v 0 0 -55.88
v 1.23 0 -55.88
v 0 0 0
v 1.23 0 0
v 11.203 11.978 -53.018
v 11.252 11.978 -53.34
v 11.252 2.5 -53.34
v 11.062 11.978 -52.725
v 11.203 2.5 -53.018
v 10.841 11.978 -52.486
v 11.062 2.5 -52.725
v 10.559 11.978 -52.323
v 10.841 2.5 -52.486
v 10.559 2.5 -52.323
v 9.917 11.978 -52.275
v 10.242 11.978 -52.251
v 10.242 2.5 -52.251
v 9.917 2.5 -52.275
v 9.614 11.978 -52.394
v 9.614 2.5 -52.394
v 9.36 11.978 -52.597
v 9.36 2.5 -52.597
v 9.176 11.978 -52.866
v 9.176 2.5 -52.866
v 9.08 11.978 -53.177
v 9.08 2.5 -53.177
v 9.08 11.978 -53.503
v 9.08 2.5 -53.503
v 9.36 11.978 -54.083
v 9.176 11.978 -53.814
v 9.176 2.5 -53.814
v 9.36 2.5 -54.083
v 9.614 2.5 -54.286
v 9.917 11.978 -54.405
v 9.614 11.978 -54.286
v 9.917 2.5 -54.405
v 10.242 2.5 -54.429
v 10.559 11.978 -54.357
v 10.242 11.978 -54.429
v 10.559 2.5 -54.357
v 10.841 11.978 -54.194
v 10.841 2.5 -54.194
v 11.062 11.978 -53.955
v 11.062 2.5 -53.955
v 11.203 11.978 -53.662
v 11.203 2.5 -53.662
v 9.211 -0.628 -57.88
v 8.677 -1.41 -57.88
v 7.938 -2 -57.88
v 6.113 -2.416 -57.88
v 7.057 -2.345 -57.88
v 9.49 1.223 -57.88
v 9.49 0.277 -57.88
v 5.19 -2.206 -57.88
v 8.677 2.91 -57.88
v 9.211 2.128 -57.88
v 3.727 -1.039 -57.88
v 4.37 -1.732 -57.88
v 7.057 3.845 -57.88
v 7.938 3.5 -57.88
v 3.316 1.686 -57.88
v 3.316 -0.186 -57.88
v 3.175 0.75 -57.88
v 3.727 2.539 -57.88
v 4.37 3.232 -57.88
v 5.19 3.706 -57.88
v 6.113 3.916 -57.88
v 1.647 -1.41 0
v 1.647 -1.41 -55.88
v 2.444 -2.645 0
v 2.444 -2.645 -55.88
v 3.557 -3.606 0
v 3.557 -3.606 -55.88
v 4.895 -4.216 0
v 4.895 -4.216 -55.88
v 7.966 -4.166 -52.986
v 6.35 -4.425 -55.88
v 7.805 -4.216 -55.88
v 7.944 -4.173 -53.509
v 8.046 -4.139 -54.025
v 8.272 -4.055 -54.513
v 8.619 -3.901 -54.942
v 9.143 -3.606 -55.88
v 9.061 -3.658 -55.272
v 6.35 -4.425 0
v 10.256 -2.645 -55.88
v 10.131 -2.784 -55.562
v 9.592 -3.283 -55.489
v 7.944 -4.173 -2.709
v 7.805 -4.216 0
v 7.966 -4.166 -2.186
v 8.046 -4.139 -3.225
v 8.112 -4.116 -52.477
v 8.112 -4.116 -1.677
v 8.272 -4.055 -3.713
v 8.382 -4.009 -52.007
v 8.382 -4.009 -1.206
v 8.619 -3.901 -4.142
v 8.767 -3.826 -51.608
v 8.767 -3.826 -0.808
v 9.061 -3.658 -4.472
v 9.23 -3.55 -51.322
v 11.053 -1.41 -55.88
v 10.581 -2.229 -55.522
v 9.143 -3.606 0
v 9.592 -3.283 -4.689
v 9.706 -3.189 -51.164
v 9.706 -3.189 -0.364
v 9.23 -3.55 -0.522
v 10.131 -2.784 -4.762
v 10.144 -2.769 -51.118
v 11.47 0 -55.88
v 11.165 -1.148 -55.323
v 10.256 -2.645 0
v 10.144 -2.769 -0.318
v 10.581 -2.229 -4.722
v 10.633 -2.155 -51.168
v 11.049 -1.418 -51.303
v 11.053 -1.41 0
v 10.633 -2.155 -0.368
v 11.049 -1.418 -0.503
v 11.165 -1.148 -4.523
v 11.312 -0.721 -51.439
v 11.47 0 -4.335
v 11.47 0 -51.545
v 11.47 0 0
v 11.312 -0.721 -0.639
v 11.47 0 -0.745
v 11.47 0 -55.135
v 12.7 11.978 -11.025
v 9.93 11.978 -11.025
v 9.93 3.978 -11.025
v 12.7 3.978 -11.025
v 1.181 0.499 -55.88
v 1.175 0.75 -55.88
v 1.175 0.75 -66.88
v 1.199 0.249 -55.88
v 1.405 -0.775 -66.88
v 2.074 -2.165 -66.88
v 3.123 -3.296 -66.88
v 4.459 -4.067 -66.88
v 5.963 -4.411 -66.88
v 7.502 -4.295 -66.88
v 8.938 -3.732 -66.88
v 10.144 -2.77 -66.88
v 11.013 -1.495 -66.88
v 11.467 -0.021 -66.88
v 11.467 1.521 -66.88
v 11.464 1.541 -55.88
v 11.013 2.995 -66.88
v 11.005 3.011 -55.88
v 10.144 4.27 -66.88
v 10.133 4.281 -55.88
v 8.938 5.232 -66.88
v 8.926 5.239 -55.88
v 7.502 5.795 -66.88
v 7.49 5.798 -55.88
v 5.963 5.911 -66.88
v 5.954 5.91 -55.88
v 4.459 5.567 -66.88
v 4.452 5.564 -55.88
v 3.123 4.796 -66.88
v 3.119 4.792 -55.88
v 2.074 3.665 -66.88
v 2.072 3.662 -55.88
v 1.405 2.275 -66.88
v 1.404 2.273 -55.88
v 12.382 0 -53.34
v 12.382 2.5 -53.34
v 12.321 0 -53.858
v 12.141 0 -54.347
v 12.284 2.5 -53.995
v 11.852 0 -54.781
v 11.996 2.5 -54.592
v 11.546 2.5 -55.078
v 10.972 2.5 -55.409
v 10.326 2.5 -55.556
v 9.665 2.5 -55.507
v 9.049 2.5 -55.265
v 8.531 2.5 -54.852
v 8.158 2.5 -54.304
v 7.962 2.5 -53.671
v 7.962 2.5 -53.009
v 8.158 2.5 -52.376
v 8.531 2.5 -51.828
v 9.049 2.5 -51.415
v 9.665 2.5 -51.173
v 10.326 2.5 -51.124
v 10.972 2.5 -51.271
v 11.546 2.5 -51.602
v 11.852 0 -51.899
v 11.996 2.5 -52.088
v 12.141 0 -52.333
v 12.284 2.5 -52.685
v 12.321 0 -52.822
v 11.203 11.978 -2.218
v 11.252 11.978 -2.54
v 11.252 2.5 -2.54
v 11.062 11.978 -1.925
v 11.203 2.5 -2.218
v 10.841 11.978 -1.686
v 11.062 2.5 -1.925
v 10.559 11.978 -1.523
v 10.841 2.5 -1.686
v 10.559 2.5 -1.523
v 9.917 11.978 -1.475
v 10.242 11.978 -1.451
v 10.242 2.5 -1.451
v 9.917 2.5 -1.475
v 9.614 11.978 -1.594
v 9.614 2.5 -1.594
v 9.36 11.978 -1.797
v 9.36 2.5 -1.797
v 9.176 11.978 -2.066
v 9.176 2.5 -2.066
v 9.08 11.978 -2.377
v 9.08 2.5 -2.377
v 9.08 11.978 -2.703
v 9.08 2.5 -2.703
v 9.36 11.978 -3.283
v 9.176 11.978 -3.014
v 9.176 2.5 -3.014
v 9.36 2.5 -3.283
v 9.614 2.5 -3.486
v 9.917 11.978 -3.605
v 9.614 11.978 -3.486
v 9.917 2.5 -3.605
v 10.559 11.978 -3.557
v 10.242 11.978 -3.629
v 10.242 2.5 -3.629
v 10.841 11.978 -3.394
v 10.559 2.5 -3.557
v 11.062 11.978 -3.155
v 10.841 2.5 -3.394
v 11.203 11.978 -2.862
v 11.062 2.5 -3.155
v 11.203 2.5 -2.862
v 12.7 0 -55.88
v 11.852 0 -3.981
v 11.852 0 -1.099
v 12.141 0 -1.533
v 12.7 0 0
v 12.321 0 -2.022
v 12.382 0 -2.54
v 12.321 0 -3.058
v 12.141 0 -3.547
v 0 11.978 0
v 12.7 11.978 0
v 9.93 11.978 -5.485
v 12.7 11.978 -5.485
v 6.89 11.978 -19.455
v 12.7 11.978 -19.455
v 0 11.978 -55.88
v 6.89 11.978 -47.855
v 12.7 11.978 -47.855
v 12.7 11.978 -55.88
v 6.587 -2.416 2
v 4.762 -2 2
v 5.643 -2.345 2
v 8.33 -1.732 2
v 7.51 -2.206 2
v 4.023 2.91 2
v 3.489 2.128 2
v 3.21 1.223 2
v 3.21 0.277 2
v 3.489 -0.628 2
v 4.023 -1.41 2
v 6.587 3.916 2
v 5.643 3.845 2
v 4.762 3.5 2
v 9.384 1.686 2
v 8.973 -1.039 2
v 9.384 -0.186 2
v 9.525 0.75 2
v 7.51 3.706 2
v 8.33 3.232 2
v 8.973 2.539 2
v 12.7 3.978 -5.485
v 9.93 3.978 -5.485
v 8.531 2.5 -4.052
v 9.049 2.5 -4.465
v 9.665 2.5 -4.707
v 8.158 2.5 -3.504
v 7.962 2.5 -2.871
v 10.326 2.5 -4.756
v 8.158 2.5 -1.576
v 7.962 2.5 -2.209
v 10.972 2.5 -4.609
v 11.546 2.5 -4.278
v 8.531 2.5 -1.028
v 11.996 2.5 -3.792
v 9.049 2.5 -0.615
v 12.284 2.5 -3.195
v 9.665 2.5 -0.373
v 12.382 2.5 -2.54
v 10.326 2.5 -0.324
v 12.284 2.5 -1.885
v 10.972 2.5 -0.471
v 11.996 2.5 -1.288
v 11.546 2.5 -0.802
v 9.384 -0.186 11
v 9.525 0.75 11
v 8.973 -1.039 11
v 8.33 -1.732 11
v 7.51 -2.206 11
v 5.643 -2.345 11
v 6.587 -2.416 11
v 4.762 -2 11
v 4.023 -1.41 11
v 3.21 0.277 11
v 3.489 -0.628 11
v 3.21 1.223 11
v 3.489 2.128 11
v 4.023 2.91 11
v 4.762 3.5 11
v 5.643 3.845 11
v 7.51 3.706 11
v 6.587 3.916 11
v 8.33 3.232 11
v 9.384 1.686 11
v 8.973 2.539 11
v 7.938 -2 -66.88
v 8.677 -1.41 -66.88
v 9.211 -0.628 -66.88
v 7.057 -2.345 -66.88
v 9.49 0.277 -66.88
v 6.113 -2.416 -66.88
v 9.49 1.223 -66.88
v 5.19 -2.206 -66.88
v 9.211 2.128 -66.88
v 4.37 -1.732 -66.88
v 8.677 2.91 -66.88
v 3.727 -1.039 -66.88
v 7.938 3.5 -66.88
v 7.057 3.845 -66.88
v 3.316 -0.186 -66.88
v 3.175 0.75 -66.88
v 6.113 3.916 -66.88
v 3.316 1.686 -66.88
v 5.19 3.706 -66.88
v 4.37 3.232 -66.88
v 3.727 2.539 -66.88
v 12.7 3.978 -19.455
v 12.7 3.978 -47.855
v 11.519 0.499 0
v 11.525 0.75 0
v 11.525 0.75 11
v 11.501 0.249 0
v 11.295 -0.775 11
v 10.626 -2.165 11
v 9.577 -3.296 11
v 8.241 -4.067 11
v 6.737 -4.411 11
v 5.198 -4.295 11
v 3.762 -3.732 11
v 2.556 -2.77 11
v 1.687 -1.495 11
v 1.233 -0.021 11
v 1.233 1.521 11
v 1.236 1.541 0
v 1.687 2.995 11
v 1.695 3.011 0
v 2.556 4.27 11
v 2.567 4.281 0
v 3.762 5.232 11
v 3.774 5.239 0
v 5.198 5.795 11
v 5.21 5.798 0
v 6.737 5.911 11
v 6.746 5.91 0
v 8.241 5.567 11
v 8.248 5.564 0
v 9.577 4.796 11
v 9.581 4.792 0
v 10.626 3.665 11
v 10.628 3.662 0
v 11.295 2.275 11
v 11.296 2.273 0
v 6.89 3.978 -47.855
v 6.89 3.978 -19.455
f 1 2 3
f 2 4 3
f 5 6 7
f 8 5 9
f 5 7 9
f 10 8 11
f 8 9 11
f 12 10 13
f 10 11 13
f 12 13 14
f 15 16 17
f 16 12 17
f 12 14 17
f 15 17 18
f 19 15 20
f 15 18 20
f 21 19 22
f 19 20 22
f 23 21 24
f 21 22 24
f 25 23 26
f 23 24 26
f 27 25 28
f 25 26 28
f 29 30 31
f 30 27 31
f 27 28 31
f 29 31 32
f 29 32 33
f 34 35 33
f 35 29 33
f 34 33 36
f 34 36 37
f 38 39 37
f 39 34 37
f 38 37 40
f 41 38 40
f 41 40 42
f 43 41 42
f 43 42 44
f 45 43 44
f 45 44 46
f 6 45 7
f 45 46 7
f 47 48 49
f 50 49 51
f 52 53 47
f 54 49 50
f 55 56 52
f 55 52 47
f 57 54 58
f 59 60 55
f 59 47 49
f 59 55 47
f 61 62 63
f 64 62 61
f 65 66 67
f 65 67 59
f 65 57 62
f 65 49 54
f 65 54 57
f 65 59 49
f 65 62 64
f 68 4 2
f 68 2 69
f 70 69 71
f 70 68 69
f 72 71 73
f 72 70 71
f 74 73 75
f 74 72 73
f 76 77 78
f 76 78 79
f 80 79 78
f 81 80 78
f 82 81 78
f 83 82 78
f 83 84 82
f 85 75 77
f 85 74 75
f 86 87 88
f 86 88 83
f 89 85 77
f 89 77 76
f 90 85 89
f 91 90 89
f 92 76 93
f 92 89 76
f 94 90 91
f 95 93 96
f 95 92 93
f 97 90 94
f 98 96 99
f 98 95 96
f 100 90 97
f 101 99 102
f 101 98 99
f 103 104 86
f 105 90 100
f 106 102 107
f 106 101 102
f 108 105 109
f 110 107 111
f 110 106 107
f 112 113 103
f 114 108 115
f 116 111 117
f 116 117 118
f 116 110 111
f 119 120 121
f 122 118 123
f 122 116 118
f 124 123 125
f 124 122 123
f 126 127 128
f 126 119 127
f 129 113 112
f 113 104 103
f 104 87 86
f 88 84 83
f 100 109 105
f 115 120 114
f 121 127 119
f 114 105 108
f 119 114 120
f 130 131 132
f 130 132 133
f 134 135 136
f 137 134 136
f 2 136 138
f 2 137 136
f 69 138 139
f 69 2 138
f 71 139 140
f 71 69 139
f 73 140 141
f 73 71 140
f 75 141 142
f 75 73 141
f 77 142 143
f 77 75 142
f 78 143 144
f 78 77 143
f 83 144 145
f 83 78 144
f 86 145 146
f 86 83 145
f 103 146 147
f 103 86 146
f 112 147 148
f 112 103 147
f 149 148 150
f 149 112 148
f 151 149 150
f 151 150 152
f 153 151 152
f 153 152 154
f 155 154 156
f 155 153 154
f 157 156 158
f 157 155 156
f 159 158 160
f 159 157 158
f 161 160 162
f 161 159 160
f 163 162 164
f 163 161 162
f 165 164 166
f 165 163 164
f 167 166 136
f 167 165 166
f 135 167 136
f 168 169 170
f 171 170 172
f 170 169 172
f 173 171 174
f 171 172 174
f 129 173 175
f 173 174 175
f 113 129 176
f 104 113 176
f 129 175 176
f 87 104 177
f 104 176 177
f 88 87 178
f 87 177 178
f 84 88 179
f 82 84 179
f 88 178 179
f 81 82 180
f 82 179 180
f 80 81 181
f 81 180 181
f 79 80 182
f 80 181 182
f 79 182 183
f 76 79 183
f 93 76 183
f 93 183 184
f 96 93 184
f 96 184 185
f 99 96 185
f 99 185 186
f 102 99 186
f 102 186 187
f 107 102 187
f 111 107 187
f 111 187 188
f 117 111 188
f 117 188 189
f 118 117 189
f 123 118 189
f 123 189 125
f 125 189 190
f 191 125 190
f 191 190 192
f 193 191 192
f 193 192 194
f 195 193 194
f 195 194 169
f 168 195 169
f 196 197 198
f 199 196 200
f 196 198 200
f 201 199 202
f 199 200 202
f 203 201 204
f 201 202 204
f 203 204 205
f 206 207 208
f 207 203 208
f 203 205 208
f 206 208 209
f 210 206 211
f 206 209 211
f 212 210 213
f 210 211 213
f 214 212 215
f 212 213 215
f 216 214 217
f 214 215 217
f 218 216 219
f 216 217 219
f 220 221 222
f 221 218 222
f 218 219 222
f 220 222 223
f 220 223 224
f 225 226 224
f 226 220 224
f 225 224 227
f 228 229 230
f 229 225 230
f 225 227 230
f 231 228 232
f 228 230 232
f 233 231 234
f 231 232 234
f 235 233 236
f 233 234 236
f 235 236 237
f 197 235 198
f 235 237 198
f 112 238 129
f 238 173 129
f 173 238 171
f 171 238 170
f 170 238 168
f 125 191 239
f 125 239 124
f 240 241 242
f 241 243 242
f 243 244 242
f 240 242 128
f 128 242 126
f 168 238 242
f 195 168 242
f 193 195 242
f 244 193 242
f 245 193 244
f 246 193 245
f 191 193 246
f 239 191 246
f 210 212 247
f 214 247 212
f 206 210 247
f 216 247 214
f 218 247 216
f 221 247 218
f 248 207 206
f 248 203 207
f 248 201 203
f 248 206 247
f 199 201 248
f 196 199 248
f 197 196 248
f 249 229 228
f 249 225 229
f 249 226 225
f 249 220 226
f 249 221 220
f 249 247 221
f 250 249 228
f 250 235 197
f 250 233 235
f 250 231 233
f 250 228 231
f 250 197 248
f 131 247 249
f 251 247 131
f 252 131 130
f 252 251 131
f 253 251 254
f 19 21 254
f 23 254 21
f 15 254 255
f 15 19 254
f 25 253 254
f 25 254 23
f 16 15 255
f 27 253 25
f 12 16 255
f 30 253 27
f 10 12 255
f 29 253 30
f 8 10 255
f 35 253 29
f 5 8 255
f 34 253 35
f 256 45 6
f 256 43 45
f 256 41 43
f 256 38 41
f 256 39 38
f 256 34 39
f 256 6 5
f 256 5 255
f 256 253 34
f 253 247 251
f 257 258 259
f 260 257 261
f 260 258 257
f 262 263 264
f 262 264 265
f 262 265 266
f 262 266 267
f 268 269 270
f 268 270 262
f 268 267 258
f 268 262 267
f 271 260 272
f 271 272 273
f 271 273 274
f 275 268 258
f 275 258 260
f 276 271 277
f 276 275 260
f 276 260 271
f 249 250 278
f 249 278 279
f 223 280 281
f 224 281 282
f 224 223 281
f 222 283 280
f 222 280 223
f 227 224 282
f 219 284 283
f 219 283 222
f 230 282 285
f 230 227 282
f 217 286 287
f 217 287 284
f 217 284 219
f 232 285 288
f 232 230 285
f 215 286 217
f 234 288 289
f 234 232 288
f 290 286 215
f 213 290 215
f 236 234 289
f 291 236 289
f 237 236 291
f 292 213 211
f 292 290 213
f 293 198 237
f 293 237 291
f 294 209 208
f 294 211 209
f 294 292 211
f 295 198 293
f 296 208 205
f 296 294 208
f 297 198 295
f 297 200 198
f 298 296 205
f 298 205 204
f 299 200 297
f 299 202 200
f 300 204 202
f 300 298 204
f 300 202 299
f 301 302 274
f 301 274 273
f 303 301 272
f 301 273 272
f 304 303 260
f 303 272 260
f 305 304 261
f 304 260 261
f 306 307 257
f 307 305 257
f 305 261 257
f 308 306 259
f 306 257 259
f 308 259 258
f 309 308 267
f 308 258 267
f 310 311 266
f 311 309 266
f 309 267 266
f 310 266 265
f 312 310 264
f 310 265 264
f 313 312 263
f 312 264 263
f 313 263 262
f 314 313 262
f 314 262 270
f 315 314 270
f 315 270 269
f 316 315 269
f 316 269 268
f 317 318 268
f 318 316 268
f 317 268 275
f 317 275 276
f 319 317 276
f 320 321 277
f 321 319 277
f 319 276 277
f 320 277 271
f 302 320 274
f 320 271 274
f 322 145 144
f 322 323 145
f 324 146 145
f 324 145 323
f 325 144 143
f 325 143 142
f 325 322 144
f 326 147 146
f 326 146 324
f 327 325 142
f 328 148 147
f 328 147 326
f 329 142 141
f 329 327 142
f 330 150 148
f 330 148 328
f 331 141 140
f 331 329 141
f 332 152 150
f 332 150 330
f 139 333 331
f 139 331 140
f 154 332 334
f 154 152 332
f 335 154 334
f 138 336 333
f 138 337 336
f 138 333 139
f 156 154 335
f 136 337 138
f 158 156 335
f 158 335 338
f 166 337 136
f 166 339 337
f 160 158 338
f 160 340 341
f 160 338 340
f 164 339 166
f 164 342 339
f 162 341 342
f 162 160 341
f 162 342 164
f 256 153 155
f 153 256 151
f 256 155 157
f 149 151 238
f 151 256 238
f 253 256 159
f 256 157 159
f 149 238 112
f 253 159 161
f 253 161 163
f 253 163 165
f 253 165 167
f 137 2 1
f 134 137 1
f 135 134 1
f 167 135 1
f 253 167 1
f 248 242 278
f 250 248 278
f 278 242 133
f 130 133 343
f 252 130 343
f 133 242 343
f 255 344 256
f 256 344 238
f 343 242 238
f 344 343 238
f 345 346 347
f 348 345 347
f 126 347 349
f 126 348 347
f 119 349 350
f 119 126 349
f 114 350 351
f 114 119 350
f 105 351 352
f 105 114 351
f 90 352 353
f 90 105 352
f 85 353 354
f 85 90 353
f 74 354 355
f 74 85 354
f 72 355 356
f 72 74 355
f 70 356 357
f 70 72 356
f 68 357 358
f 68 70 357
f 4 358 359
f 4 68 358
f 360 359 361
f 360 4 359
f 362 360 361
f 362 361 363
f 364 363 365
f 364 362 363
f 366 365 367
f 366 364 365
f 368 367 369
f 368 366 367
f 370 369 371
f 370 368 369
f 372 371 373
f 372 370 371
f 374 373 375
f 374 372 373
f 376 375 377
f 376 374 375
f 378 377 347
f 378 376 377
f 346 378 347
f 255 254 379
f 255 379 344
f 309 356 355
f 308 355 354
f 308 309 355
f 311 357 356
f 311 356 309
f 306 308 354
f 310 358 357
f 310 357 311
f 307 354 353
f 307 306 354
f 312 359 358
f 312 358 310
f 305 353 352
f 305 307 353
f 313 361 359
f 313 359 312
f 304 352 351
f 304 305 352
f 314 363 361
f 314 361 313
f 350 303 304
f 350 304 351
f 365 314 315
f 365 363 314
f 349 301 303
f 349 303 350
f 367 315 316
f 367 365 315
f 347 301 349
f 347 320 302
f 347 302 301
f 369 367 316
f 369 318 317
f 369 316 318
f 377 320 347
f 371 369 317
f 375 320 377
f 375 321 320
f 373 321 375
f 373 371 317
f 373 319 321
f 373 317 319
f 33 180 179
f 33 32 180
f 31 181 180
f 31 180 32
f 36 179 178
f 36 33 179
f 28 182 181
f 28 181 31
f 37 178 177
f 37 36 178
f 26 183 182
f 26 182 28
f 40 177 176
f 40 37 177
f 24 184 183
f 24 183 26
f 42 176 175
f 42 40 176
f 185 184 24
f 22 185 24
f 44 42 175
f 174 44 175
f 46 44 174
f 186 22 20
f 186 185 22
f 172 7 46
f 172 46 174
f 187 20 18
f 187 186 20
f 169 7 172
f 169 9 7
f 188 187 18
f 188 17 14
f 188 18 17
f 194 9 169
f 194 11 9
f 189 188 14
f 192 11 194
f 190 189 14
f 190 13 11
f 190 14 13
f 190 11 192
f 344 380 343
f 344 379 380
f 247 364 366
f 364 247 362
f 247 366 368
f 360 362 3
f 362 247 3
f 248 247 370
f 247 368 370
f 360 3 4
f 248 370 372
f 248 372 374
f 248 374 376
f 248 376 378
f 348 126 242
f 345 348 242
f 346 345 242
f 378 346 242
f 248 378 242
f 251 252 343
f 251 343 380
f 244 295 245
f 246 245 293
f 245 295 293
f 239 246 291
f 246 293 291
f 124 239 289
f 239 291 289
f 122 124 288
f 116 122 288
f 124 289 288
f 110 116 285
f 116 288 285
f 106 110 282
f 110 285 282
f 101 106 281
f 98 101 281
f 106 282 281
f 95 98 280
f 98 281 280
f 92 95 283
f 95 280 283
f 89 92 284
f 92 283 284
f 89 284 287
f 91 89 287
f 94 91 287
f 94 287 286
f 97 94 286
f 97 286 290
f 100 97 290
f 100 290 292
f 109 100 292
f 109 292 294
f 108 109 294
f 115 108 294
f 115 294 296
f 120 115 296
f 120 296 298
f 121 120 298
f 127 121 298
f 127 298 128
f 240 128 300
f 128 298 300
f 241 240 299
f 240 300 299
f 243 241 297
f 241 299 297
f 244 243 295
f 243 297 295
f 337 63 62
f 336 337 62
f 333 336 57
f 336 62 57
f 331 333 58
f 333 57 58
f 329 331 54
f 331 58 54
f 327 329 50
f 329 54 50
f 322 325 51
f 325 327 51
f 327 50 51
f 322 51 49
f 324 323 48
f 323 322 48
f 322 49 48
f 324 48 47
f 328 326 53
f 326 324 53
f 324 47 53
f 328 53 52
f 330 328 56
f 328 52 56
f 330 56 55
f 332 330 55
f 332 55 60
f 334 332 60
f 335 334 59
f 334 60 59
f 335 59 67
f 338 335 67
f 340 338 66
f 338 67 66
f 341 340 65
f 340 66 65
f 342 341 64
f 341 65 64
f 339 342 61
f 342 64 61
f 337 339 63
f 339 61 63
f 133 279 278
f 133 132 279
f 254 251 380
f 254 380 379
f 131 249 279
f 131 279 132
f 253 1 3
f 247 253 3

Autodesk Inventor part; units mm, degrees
ref_plane "YZ Plane" through (0, 0, 0) normal (1, 0, 0) x (0, 1, 0)
ref_plane "XZ Plane" through (0, 0, 0) normal (0, 1, 0) x (-1, 0, 0)
ref_plane "XY Plane" through (0, 0, 0) normal (0, 0, 1) x (1, 0, 0)
sketch "Sketch1" plane through (0, 0, 0) normal (0, 1, 0) x (-1, 0, 0)
  line L0 (0, -55.88) -> (-12.7, -55.88)
  line L1 (-12.7, 0) -> (0, 0)
  line L2 (0, 0) -> (0, -20.94)
  line L3 (0, -34.94) -> (0, -55.88)
  line L4 (-12.7, -55.88) -> (-12.7, -34.94)
  line L5 (-12.7, -20.94) -> (-12.7, 0)
  line L6 (0, -20.94) -> (0, -34.94)
  line L7 (-12.7, -20.94) -> (-12.7, -34.94)
  dimension "d1" = 55.88
  dimension "d2" = 12.7
extrude "Extrusion1" add sketch "Sketch1" along normal blind 1.5
sketch "Sketch2" plane through (0, 1.5, 0) normal (0, 1, 0) x (1, 0, 0)
  line L0 (12.7, 0) -> (12.7, 55.88) projected
  line L1 (12.7, 0) -> (10.16, 0)
  line L2 (12.7, 2.54) -> (12.7, 0)
  circle A0 centre (10.16, 2.54) radius 1.092
  circle A1 centre (10.16, 53.34) radius 1.092
  point P0 (0, 0)
  dimension "d8" = 2.184
  dimension "d10" = 2.184
extrude "Extrusion2" cut sketch "Sketch2" against normal blind 1.5
sketch "Sketch5" plane through (0, 0, 0) normal (0, 0, 1) x (1, 0, 0)
  line L0 (12.7, 0) -> (0, 0) projected
  line L1 (6.35, 0) -> (6.35, 1.5)
  line L2 (12.7, 1.5) -> (0, 1.5) projected
  line L3 (0, 0) -> (0, 1.5) projected
  line L4 (0, 0.75) -> (12.7, 0.75)
  line L5 (12.7, 0) -> (12.7, 1.5) projected
  circle A0 centre (6.35, 0.75) radius 5.175
  dimension "d30" = 10.35
extrude "Extrusion5" add sketch "Sketch5" along normal blind 2 contours A0 L0 | L0 L1 L4 A0 | L0 A0 L4 L1 | L4 L1 L2 A0 | L4 A0 L2 L1 | L2 A0
sketch "Sketch6" plane through (6.35, 0.75, 2) normal (0, 0, 1) x (1, 0, 0)
  circle A0 centre (0, 0) radius 5.175
  circle A1 centre (0, 0) radius 3.175
  point P0 (-6.35, -0.75)
  dimension "d35" = 6.35
extrude "Extrusion6" add sketch "Sketch6" along normal blind 9
sketch "Sketch7" plane through (12.7, 0, -55.88) normal (0, 0, -1) x (-1, 0, 0)
  line L0 (0, 0) -> (0, 1.5) projected
  line L1 (0, 0.75) -> (12.7, 0.75)
  line L2 (12.7, 0) -> (12.7, 1.5) projected
  line L3 (11.4704, 1.5) -> (1.2296, 1.5) projected
  line L4 (6.35, 1.5) -> (6.35, 0)
  circle A0 centre (6.35, 0.75) radius 5.175
extrude "Extrusion7" add sketch "Sketch7" along normal blind 2
sketch "Sketch8" plane through (6.35, 0.75, -57.88) normal (0, 0, -1) x (-1, 0, 0)
  circle A0 centre (0, 0) radius 5.175
  circle A1 centre (0, 0) radius 3.175
  point P0 (6.35, -0.75)
  dimension "d40" = 6.35
extrude "Extrusion8" add sketch "Sketch8" along normal blind 9
thread "Thread1" size "1/4-20 UNC" class "2B" standard "ANSI Unified Screw Threads" full length
thread "Thread2" size "1/4-20 UNC" class "2B" standard "ANSI Unified Screw Threads" full length
sketch "Sketch9" plane through (0, 0, 0) normal (0, 0, -1) x (-1, 0, 0)
  arc A0 (-11.4704, 0) -> (-1.2296, 0) centre (-6.35, 0.75) ccw projected
  line L0 (0, 0) -> (-1.2296, 0) projected
  line L1 (-11.4704, 0) -> (-1.2296, 0)
  circle A1 centre (-6.35, 0.75) radius 5.175
extrude "Extrusion9" add sketch "Sketch9" along normal up to next contours L1 A0
sketch "Sketch10" plane through (10.16, 0, -2.54) normal (0, 1, 0) x (1, 0, 0)
  circle A0 centre (0, 0) radius 1.092
  circle A1 centre (0, 50.8) radius 1.092 projected
  circle A2 centre (0, 50.8) radius 1.092
  point P0 (-10.16, -2.54)
  dimension "d60" = 2.184
extrude "Extrusion10" cut sketch "Sketch10" against normal up to next
sketch "Sketch12" plane through (0, 1.5, 0) normal (0, 1, 0) x (1, 0, 0)
  circle A0 centre (10.16, 2.54) radius 1.092 projected
  circle A1 centre (10.16, 2.54) radius 1.092
  circle A2 centre (10.16, 2.54) radius 2.2225
  circle A3 centre (10.16, 53.34) radius 1.092 projected
  circle A4 centre (10.16, 53.34) radius 1.092
  circle A5 centre (10.16, 53.34) radius 2.2225
  point P0 (0, 0)
  dimension "d54" = 4.445
  dimension "d55" = 4.445
extrude "Extrusion11" cut sketch "Sketch12" against normal blind 5.925
sketch "Sketch13" plane through (0, 1.5, 0) normal (0, 1, 0) x (1, 0, 0)
  line L0 (12.7, 0) -> (12.7, 55.88) projected
  line L1 (12.7, 55.88) -> (0, 55.88)
  line L2 (0, 55.88) -> (0, 0)
  line L3 (0, 0) -> (12.7, 0)
  line L4 (12.7, 0) -> (12.7, 55.88)
  circle A0 centre (10.16, 53.34) radius 1.092 projected
  circle A1 centre (10.16, 53.34) radius 1.092
  circle A2 centre (10.16, 2.54) radius 1.092 projected
  circle A3 centre (10.16, 2.54) radius 1.092
extrude "Extrusion12" add sketch "Sketch13" along normal blind 10.4775
thread "Thread5" size "2-56 UNC" class "2B" standard "ANSI Unified Screw Threads" full length
thread "Thread6" size "2-56 UNC" class "2B" standard "ANSI Unified Screw Threads" full length
sketch "Sketch14" plane through (10.16, 1.5, -53.34) normal (0, -1, 0) x (1, 0, 0)
  circle A0 centre (0, 0) radius 1.092 projected
  circle A1 centre (0, 0) radius 2.2225
  circle A2 centre (0, 50.8) radius 2.2225 projected
  circle A3 centre (0, 50.8) radius 2.2225
  circle A4 centre (0, 0) radius 1.092
  circle A5 centre (0, 50.8) radius 1.092
  point P0 (-10.16, 53.34)
extrude "Extrusion13" cut sketch "Sketch14" against normal blind 1
sketch "Sketch15" plane through (0, 11.9775, 0) normal (0, 1, 0) x (1, 0, 0)
  line L0 (12.7, 0) -> (12.7, 6.985)
  line L1 (12.7, 0) -> (12.7, 55.88) projected
  line L2 (12.7, 0) -> (19.685, 0) construction
  line L3 (11.525, -11) -> (11.525, 66.88) projected
  line L4 (11.43, 6.985) -> (13.97, 6.985) construction
  line L5 (11.43, 6.985) -> (12.43, 6.985) construction
  line L6 (11.43, 9.525) -> (12.43, 9.525) construction
  line L7 (12.7, 5.985) -> (12.7, 10.525)
  line L8 (12.7, 5.985) -> (12.7, 5.485)
  line L9 (12.7, 5.485) -> (9.93, 5.485)
  line L10 (9.93, 5.485) -> (9.93, 11.025)
  line L11 (9.93, 11.025) -> (12.7, 11.025)
  line L12 (12.7, 11.025) -> (12.7, 10.525)
  point P0 (0, 0)
  dimension "d72" = 90
  dimension "d130" = 0.5
  dimension "d131" = 2.77
  dimension "d132" = 5.54
extrude "Extrusion14" cut sketch "Sketch15" against normal blind 8
sketch "Sketch16" plane through (0, 11.9775, 0) normal (0, 1, 0) x (1, 0, 0)
  line L0 (12.7, 0) -> (12.7, 55.88) projected
  line L1 (12.7, 40.234) -> (13.97, 40.234) construction
  line L2 (0, 0) -> (12.7, 0) projected
  line L3 (11.43, 0) -> (40.005, 0) construction
  line L4 (11.525, -11) -> (11.525, 66.88) projected
  line L5 (11.43, 28.575) -> (13.97, 28.575) construction
  line L6 (11.43, 46.355) -> (12.43, 46.355) construction
  line L7 (11.43, 28.575) -> (13.97, 28.575) construction
  line L8 (11.43, 20.955) -> (12.43, 20.955) construction
  line L9 (6.89, 19.955) -> (6.89, 47.355)
  line L10 (12.7, 47.355) -> (12.7, 19.955)
  line L11 (6.89, 47.355) -> (6.89, 47.855)
  line L12 (6.89, 47.855) -> (12.7, 47.855)
  line L13 (12.7, 47.855) -> (12.7, 47.355)
  line L14 (12.7, 19.955) -> (12.7, 19.455)
  line L15 (12.7, 0) -> (12.7, 55.88) projected
  line L16 (12.7, 19.455) -> (6.89, 19.455)
  line L17 (6.89, 19.455) -> (6.89, 19.955)
  point P0 (12.7, 10.525)
  dimension "d123" = 5.81
  dimension "d129" = 28.4
extrude "Extrusion15" cut sketch "Sketch16" against normal blind 8 contours L16 L4 L12 L0 | L16 L17 L9 L11 L12 L4
properties part number "Line Sensor 6 Bracket"
